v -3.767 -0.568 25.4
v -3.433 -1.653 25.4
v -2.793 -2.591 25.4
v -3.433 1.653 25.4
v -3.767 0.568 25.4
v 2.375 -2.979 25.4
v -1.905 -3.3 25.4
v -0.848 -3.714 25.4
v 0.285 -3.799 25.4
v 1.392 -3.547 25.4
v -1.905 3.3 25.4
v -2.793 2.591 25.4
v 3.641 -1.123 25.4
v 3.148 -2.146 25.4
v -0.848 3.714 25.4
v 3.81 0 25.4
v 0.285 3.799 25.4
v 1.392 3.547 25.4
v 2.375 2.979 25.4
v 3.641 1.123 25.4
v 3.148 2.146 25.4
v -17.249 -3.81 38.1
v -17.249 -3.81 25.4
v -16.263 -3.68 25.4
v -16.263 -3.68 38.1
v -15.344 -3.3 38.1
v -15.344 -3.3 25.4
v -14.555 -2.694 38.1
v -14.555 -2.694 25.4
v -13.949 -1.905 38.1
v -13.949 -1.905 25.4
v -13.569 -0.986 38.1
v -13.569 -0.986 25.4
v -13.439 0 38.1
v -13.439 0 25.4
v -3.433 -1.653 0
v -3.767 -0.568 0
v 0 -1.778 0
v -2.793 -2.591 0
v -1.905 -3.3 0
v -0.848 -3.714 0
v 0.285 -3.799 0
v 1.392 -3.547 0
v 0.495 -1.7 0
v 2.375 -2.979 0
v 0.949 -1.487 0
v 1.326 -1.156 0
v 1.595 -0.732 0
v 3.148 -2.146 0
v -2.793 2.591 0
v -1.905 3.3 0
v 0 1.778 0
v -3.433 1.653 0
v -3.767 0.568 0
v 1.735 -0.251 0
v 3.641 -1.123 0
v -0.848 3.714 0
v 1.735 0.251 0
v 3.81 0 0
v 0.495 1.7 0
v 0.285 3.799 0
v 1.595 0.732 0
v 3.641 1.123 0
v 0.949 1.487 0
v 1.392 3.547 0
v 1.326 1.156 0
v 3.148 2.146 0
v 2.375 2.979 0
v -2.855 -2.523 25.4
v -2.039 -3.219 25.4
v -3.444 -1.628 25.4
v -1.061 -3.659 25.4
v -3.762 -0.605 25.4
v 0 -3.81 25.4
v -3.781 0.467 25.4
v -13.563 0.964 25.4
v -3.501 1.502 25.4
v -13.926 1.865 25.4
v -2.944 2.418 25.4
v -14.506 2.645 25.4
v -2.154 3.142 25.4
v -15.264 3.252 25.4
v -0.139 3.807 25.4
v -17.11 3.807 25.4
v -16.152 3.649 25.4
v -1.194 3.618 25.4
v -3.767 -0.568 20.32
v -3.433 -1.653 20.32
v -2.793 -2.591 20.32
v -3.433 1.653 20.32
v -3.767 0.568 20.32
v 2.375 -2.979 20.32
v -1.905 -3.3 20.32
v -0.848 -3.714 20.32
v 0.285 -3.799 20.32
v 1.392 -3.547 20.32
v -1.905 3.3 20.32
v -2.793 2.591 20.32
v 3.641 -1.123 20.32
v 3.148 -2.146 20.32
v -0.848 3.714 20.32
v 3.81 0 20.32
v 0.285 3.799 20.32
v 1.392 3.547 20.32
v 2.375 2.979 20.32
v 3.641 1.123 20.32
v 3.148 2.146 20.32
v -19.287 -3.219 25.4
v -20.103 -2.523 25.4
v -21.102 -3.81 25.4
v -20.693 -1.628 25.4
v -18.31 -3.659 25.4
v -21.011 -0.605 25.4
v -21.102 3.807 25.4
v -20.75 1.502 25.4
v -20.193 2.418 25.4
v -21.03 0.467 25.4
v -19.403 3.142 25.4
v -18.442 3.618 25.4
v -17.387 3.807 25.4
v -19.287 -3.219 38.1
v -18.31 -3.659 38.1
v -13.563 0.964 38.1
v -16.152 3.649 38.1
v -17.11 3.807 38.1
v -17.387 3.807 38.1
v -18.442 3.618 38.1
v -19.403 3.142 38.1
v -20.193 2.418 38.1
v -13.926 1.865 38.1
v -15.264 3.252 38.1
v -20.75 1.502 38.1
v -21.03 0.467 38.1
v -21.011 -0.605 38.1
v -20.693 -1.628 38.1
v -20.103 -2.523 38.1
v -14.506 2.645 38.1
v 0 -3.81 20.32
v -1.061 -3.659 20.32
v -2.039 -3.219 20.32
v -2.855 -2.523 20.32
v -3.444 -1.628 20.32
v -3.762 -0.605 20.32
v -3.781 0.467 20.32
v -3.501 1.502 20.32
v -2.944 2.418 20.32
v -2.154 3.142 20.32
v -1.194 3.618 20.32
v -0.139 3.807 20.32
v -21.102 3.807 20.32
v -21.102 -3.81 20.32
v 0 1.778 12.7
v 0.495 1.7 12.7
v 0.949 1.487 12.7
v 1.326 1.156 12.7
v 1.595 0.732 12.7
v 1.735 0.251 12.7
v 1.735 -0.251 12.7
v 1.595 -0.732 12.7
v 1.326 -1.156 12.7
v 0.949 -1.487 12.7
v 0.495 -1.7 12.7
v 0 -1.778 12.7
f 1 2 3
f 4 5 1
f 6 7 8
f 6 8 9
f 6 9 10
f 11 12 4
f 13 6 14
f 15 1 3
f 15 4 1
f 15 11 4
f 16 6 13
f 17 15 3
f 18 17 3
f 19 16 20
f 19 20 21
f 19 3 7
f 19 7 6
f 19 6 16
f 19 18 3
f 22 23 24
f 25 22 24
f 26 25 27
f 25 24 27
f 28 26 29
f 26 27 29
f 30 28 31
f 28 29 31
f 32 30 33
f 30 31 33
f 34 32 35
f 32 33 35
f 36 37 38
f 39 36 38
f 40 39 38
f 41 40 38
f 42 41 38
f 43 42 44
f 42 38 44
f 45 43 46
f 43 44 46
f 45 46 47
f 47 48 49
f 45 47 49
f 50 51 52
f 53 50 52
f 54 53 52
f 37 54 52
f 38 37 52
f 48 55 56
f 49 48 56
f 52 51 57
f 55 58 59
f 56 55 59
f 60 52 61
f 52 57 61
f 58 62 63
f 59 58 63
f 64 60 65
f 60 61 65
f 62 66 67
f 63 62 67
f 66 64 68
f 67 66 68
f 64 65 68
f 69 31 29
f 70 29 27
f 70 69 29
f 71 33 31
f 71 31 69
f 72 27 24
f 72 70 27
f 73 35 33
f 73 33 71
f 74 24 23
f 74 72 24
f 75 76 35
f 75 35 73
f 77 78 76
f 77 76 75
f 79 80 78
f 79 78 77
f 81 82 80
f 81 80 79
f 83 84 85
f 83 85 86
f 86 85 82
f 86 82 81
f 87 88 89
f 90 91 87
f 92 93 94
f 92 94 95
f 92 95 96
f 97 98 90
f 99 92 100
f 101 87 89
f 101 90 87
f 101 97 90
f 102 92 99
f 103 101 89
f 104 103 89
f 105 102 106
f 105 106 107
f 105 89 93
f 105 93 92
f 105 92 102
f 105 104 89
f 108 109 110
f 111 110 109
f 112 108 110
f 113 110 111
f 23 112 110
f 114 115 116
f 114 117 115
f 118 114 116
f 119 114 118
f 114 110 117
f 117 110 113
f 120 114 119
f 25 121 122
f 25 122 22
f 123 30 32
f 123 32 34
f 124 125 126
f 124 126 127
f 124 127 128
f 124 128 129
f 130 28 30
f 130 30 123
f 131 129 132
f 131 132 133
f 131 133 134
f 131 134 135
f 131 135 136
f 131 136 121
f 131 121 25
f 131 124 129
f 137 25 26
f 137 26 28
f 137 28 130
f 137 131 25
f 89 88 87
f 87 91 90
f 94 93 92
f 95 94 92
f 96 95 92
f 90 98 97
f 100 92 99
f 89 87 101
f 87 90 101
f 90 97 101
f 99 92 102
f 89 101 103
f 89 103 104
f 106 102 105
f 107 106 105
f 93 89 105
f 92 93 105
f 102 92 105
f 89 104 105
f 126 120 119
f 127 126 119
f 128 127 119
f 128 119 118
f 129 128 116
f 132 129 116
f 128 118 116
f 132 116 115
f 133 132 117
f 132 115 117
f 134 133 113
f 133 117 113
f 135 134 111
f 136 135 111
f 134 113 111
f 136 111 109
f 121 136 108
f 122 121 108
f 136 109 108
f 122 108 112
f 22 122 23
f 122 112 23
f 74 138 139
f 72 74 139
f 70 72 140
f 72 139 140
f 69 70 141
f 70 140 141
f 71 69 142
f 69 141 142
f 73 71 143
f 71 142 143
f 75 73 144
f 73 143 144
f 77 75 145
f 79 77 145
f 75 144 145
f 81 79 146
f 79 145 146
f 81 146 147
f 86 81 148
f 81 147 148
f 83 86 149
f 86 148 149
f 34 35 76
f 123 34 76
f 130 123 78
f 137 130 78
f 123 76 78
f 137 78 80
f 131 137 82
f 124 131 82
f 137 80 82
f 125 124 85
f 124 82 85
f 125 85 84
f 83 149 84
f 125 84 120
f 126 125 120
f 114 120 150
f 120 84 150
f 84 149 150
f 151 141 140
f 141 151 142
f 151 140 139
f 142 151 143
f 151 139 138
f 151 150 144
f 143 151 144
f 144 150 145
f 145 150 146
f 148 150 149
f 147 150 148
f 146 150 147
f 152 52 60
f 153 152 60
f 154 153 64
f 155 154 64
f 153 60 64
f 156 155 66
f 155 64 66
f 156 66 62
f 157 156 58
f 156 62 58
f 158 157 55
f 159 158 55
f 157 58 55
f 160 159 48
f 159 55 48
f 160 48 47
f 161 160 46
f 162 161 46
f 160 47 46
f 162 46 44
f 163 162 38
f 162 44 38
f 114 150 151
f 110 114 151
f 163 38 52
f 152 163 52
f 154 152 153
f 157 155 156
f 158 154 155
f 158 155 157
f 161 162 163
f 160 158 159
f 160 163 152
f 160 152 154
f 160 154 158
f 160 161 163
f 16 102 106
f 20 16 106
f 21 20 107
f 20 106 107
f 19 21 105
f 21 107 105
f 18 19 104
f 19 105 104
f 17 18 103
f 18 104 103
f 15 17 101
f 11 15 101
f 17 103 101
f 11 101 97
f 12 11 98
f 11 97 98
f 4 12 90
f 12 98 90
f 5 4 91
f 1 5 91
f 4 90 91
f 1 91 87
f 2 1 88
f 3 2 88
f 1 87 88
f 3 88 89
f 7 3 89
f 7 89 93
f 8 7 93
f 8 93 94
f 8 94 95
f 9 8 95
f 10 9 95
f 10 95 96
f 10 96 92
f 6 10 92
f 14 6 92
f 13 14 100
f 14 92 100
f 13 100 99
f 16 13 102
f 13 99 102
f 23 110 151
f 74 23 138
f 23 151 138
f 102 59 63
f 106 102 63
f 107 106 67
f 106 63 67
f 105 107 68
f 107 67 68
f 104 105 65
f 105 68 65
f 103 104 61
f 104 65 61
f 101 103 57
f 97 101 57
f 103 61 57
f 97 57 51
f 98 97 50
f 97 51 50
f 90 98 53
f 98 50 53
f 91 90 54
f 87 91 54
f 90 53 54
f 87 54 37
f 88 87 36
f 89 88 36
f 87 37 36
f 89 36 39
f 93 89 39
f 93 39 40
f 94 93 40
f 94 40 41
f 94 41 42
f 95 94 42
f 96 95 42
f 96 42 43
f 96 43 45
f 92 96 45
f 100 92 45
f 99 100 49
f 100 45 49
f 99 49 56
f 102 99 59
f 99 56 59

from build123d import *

# Parameters (mm, degrees)
F0_R     = 3.81
F1_DEPTH = 20.32
F3_DEPTH = 12.7
F5_DEPTH = 5.08
F6_R     = 3.81
F7_DEPTH = 5.08
F9_DEPTH = 12.7


with BuildPart() as f1:
    # F0 (on Top) → F1 (new body)
    with BuildSketch(Plane.XY):
        Circle(F0_R)
    extrude(amount=F1_DEPTH)

    # F2 (on face) → F3 (cut)
    with BuildSketch(Plane(origin=(0, 0, 0), x_dir=(1, 0, 0), z_dir=(0, 0, -1))):
        with BuildLine():
            ThreePointArc((0, -1.778), (1.7523079513, 0), (0, 1.778))
            Line((0, 1.778), (0, -1.778))
        make_face()
    extrude(amount=-F3_DEPTH, mode=Mode.SUBTRACT)


with BuildPart() as f5:
    # F4 (on face) → F5 (new body)
    with BuildSketch(Plane.XY.offset(20.32)):
        with BuildLine():
            Line((-21.1020186543, -3.81), (0, -3.81))
            ThreePointArc((0, -3.81), (-3.8093697104, -0.0692994208), (-0.1385759132, 3.80747905))
            Line((-0.1385759132, 3.80747905), (-21.1020186543, 3.80747905))
            Line((-21.1020186543, 3.80747905), (-21.1020186543, -3.81))
        make_face()
    extrude(amount=F5_DEPTH)

    # F8 (on face) → F9 (join)
    with BuildSketch(Plane.XY.offset(25.4)):
        with BuildLine():
            ThreePointArc((-17.2487793983, -3.81), (-14.554702562, -2.6940768363), (-13.4387793983, 0))
            ThreePointArc((-13.4387793983, 0), (-14.5061461537, 2.6446290638), (-17.1102034851, 3.80747905))
            Line((-17.1102034851, 3.80747905), (-17.3873553116, 3.80747905))
            ThreePointArc((-17.3873553116, 3.80747905), (-21.0581491087, -0.0692994208), (-17.2487793983, -3.81))
        make_face()
    extrude(amount=F9_DEPTH)


with BuildPart() as f7:
    # F6 (on face) → F7 (new body)
    with BuildSketch(Plane.XY.offset(20.32)):
        Circle(F6_R)
    extrude(amount=F7_DEPTH)


solid = Compound([f1.part, f5.part, f7.part])
